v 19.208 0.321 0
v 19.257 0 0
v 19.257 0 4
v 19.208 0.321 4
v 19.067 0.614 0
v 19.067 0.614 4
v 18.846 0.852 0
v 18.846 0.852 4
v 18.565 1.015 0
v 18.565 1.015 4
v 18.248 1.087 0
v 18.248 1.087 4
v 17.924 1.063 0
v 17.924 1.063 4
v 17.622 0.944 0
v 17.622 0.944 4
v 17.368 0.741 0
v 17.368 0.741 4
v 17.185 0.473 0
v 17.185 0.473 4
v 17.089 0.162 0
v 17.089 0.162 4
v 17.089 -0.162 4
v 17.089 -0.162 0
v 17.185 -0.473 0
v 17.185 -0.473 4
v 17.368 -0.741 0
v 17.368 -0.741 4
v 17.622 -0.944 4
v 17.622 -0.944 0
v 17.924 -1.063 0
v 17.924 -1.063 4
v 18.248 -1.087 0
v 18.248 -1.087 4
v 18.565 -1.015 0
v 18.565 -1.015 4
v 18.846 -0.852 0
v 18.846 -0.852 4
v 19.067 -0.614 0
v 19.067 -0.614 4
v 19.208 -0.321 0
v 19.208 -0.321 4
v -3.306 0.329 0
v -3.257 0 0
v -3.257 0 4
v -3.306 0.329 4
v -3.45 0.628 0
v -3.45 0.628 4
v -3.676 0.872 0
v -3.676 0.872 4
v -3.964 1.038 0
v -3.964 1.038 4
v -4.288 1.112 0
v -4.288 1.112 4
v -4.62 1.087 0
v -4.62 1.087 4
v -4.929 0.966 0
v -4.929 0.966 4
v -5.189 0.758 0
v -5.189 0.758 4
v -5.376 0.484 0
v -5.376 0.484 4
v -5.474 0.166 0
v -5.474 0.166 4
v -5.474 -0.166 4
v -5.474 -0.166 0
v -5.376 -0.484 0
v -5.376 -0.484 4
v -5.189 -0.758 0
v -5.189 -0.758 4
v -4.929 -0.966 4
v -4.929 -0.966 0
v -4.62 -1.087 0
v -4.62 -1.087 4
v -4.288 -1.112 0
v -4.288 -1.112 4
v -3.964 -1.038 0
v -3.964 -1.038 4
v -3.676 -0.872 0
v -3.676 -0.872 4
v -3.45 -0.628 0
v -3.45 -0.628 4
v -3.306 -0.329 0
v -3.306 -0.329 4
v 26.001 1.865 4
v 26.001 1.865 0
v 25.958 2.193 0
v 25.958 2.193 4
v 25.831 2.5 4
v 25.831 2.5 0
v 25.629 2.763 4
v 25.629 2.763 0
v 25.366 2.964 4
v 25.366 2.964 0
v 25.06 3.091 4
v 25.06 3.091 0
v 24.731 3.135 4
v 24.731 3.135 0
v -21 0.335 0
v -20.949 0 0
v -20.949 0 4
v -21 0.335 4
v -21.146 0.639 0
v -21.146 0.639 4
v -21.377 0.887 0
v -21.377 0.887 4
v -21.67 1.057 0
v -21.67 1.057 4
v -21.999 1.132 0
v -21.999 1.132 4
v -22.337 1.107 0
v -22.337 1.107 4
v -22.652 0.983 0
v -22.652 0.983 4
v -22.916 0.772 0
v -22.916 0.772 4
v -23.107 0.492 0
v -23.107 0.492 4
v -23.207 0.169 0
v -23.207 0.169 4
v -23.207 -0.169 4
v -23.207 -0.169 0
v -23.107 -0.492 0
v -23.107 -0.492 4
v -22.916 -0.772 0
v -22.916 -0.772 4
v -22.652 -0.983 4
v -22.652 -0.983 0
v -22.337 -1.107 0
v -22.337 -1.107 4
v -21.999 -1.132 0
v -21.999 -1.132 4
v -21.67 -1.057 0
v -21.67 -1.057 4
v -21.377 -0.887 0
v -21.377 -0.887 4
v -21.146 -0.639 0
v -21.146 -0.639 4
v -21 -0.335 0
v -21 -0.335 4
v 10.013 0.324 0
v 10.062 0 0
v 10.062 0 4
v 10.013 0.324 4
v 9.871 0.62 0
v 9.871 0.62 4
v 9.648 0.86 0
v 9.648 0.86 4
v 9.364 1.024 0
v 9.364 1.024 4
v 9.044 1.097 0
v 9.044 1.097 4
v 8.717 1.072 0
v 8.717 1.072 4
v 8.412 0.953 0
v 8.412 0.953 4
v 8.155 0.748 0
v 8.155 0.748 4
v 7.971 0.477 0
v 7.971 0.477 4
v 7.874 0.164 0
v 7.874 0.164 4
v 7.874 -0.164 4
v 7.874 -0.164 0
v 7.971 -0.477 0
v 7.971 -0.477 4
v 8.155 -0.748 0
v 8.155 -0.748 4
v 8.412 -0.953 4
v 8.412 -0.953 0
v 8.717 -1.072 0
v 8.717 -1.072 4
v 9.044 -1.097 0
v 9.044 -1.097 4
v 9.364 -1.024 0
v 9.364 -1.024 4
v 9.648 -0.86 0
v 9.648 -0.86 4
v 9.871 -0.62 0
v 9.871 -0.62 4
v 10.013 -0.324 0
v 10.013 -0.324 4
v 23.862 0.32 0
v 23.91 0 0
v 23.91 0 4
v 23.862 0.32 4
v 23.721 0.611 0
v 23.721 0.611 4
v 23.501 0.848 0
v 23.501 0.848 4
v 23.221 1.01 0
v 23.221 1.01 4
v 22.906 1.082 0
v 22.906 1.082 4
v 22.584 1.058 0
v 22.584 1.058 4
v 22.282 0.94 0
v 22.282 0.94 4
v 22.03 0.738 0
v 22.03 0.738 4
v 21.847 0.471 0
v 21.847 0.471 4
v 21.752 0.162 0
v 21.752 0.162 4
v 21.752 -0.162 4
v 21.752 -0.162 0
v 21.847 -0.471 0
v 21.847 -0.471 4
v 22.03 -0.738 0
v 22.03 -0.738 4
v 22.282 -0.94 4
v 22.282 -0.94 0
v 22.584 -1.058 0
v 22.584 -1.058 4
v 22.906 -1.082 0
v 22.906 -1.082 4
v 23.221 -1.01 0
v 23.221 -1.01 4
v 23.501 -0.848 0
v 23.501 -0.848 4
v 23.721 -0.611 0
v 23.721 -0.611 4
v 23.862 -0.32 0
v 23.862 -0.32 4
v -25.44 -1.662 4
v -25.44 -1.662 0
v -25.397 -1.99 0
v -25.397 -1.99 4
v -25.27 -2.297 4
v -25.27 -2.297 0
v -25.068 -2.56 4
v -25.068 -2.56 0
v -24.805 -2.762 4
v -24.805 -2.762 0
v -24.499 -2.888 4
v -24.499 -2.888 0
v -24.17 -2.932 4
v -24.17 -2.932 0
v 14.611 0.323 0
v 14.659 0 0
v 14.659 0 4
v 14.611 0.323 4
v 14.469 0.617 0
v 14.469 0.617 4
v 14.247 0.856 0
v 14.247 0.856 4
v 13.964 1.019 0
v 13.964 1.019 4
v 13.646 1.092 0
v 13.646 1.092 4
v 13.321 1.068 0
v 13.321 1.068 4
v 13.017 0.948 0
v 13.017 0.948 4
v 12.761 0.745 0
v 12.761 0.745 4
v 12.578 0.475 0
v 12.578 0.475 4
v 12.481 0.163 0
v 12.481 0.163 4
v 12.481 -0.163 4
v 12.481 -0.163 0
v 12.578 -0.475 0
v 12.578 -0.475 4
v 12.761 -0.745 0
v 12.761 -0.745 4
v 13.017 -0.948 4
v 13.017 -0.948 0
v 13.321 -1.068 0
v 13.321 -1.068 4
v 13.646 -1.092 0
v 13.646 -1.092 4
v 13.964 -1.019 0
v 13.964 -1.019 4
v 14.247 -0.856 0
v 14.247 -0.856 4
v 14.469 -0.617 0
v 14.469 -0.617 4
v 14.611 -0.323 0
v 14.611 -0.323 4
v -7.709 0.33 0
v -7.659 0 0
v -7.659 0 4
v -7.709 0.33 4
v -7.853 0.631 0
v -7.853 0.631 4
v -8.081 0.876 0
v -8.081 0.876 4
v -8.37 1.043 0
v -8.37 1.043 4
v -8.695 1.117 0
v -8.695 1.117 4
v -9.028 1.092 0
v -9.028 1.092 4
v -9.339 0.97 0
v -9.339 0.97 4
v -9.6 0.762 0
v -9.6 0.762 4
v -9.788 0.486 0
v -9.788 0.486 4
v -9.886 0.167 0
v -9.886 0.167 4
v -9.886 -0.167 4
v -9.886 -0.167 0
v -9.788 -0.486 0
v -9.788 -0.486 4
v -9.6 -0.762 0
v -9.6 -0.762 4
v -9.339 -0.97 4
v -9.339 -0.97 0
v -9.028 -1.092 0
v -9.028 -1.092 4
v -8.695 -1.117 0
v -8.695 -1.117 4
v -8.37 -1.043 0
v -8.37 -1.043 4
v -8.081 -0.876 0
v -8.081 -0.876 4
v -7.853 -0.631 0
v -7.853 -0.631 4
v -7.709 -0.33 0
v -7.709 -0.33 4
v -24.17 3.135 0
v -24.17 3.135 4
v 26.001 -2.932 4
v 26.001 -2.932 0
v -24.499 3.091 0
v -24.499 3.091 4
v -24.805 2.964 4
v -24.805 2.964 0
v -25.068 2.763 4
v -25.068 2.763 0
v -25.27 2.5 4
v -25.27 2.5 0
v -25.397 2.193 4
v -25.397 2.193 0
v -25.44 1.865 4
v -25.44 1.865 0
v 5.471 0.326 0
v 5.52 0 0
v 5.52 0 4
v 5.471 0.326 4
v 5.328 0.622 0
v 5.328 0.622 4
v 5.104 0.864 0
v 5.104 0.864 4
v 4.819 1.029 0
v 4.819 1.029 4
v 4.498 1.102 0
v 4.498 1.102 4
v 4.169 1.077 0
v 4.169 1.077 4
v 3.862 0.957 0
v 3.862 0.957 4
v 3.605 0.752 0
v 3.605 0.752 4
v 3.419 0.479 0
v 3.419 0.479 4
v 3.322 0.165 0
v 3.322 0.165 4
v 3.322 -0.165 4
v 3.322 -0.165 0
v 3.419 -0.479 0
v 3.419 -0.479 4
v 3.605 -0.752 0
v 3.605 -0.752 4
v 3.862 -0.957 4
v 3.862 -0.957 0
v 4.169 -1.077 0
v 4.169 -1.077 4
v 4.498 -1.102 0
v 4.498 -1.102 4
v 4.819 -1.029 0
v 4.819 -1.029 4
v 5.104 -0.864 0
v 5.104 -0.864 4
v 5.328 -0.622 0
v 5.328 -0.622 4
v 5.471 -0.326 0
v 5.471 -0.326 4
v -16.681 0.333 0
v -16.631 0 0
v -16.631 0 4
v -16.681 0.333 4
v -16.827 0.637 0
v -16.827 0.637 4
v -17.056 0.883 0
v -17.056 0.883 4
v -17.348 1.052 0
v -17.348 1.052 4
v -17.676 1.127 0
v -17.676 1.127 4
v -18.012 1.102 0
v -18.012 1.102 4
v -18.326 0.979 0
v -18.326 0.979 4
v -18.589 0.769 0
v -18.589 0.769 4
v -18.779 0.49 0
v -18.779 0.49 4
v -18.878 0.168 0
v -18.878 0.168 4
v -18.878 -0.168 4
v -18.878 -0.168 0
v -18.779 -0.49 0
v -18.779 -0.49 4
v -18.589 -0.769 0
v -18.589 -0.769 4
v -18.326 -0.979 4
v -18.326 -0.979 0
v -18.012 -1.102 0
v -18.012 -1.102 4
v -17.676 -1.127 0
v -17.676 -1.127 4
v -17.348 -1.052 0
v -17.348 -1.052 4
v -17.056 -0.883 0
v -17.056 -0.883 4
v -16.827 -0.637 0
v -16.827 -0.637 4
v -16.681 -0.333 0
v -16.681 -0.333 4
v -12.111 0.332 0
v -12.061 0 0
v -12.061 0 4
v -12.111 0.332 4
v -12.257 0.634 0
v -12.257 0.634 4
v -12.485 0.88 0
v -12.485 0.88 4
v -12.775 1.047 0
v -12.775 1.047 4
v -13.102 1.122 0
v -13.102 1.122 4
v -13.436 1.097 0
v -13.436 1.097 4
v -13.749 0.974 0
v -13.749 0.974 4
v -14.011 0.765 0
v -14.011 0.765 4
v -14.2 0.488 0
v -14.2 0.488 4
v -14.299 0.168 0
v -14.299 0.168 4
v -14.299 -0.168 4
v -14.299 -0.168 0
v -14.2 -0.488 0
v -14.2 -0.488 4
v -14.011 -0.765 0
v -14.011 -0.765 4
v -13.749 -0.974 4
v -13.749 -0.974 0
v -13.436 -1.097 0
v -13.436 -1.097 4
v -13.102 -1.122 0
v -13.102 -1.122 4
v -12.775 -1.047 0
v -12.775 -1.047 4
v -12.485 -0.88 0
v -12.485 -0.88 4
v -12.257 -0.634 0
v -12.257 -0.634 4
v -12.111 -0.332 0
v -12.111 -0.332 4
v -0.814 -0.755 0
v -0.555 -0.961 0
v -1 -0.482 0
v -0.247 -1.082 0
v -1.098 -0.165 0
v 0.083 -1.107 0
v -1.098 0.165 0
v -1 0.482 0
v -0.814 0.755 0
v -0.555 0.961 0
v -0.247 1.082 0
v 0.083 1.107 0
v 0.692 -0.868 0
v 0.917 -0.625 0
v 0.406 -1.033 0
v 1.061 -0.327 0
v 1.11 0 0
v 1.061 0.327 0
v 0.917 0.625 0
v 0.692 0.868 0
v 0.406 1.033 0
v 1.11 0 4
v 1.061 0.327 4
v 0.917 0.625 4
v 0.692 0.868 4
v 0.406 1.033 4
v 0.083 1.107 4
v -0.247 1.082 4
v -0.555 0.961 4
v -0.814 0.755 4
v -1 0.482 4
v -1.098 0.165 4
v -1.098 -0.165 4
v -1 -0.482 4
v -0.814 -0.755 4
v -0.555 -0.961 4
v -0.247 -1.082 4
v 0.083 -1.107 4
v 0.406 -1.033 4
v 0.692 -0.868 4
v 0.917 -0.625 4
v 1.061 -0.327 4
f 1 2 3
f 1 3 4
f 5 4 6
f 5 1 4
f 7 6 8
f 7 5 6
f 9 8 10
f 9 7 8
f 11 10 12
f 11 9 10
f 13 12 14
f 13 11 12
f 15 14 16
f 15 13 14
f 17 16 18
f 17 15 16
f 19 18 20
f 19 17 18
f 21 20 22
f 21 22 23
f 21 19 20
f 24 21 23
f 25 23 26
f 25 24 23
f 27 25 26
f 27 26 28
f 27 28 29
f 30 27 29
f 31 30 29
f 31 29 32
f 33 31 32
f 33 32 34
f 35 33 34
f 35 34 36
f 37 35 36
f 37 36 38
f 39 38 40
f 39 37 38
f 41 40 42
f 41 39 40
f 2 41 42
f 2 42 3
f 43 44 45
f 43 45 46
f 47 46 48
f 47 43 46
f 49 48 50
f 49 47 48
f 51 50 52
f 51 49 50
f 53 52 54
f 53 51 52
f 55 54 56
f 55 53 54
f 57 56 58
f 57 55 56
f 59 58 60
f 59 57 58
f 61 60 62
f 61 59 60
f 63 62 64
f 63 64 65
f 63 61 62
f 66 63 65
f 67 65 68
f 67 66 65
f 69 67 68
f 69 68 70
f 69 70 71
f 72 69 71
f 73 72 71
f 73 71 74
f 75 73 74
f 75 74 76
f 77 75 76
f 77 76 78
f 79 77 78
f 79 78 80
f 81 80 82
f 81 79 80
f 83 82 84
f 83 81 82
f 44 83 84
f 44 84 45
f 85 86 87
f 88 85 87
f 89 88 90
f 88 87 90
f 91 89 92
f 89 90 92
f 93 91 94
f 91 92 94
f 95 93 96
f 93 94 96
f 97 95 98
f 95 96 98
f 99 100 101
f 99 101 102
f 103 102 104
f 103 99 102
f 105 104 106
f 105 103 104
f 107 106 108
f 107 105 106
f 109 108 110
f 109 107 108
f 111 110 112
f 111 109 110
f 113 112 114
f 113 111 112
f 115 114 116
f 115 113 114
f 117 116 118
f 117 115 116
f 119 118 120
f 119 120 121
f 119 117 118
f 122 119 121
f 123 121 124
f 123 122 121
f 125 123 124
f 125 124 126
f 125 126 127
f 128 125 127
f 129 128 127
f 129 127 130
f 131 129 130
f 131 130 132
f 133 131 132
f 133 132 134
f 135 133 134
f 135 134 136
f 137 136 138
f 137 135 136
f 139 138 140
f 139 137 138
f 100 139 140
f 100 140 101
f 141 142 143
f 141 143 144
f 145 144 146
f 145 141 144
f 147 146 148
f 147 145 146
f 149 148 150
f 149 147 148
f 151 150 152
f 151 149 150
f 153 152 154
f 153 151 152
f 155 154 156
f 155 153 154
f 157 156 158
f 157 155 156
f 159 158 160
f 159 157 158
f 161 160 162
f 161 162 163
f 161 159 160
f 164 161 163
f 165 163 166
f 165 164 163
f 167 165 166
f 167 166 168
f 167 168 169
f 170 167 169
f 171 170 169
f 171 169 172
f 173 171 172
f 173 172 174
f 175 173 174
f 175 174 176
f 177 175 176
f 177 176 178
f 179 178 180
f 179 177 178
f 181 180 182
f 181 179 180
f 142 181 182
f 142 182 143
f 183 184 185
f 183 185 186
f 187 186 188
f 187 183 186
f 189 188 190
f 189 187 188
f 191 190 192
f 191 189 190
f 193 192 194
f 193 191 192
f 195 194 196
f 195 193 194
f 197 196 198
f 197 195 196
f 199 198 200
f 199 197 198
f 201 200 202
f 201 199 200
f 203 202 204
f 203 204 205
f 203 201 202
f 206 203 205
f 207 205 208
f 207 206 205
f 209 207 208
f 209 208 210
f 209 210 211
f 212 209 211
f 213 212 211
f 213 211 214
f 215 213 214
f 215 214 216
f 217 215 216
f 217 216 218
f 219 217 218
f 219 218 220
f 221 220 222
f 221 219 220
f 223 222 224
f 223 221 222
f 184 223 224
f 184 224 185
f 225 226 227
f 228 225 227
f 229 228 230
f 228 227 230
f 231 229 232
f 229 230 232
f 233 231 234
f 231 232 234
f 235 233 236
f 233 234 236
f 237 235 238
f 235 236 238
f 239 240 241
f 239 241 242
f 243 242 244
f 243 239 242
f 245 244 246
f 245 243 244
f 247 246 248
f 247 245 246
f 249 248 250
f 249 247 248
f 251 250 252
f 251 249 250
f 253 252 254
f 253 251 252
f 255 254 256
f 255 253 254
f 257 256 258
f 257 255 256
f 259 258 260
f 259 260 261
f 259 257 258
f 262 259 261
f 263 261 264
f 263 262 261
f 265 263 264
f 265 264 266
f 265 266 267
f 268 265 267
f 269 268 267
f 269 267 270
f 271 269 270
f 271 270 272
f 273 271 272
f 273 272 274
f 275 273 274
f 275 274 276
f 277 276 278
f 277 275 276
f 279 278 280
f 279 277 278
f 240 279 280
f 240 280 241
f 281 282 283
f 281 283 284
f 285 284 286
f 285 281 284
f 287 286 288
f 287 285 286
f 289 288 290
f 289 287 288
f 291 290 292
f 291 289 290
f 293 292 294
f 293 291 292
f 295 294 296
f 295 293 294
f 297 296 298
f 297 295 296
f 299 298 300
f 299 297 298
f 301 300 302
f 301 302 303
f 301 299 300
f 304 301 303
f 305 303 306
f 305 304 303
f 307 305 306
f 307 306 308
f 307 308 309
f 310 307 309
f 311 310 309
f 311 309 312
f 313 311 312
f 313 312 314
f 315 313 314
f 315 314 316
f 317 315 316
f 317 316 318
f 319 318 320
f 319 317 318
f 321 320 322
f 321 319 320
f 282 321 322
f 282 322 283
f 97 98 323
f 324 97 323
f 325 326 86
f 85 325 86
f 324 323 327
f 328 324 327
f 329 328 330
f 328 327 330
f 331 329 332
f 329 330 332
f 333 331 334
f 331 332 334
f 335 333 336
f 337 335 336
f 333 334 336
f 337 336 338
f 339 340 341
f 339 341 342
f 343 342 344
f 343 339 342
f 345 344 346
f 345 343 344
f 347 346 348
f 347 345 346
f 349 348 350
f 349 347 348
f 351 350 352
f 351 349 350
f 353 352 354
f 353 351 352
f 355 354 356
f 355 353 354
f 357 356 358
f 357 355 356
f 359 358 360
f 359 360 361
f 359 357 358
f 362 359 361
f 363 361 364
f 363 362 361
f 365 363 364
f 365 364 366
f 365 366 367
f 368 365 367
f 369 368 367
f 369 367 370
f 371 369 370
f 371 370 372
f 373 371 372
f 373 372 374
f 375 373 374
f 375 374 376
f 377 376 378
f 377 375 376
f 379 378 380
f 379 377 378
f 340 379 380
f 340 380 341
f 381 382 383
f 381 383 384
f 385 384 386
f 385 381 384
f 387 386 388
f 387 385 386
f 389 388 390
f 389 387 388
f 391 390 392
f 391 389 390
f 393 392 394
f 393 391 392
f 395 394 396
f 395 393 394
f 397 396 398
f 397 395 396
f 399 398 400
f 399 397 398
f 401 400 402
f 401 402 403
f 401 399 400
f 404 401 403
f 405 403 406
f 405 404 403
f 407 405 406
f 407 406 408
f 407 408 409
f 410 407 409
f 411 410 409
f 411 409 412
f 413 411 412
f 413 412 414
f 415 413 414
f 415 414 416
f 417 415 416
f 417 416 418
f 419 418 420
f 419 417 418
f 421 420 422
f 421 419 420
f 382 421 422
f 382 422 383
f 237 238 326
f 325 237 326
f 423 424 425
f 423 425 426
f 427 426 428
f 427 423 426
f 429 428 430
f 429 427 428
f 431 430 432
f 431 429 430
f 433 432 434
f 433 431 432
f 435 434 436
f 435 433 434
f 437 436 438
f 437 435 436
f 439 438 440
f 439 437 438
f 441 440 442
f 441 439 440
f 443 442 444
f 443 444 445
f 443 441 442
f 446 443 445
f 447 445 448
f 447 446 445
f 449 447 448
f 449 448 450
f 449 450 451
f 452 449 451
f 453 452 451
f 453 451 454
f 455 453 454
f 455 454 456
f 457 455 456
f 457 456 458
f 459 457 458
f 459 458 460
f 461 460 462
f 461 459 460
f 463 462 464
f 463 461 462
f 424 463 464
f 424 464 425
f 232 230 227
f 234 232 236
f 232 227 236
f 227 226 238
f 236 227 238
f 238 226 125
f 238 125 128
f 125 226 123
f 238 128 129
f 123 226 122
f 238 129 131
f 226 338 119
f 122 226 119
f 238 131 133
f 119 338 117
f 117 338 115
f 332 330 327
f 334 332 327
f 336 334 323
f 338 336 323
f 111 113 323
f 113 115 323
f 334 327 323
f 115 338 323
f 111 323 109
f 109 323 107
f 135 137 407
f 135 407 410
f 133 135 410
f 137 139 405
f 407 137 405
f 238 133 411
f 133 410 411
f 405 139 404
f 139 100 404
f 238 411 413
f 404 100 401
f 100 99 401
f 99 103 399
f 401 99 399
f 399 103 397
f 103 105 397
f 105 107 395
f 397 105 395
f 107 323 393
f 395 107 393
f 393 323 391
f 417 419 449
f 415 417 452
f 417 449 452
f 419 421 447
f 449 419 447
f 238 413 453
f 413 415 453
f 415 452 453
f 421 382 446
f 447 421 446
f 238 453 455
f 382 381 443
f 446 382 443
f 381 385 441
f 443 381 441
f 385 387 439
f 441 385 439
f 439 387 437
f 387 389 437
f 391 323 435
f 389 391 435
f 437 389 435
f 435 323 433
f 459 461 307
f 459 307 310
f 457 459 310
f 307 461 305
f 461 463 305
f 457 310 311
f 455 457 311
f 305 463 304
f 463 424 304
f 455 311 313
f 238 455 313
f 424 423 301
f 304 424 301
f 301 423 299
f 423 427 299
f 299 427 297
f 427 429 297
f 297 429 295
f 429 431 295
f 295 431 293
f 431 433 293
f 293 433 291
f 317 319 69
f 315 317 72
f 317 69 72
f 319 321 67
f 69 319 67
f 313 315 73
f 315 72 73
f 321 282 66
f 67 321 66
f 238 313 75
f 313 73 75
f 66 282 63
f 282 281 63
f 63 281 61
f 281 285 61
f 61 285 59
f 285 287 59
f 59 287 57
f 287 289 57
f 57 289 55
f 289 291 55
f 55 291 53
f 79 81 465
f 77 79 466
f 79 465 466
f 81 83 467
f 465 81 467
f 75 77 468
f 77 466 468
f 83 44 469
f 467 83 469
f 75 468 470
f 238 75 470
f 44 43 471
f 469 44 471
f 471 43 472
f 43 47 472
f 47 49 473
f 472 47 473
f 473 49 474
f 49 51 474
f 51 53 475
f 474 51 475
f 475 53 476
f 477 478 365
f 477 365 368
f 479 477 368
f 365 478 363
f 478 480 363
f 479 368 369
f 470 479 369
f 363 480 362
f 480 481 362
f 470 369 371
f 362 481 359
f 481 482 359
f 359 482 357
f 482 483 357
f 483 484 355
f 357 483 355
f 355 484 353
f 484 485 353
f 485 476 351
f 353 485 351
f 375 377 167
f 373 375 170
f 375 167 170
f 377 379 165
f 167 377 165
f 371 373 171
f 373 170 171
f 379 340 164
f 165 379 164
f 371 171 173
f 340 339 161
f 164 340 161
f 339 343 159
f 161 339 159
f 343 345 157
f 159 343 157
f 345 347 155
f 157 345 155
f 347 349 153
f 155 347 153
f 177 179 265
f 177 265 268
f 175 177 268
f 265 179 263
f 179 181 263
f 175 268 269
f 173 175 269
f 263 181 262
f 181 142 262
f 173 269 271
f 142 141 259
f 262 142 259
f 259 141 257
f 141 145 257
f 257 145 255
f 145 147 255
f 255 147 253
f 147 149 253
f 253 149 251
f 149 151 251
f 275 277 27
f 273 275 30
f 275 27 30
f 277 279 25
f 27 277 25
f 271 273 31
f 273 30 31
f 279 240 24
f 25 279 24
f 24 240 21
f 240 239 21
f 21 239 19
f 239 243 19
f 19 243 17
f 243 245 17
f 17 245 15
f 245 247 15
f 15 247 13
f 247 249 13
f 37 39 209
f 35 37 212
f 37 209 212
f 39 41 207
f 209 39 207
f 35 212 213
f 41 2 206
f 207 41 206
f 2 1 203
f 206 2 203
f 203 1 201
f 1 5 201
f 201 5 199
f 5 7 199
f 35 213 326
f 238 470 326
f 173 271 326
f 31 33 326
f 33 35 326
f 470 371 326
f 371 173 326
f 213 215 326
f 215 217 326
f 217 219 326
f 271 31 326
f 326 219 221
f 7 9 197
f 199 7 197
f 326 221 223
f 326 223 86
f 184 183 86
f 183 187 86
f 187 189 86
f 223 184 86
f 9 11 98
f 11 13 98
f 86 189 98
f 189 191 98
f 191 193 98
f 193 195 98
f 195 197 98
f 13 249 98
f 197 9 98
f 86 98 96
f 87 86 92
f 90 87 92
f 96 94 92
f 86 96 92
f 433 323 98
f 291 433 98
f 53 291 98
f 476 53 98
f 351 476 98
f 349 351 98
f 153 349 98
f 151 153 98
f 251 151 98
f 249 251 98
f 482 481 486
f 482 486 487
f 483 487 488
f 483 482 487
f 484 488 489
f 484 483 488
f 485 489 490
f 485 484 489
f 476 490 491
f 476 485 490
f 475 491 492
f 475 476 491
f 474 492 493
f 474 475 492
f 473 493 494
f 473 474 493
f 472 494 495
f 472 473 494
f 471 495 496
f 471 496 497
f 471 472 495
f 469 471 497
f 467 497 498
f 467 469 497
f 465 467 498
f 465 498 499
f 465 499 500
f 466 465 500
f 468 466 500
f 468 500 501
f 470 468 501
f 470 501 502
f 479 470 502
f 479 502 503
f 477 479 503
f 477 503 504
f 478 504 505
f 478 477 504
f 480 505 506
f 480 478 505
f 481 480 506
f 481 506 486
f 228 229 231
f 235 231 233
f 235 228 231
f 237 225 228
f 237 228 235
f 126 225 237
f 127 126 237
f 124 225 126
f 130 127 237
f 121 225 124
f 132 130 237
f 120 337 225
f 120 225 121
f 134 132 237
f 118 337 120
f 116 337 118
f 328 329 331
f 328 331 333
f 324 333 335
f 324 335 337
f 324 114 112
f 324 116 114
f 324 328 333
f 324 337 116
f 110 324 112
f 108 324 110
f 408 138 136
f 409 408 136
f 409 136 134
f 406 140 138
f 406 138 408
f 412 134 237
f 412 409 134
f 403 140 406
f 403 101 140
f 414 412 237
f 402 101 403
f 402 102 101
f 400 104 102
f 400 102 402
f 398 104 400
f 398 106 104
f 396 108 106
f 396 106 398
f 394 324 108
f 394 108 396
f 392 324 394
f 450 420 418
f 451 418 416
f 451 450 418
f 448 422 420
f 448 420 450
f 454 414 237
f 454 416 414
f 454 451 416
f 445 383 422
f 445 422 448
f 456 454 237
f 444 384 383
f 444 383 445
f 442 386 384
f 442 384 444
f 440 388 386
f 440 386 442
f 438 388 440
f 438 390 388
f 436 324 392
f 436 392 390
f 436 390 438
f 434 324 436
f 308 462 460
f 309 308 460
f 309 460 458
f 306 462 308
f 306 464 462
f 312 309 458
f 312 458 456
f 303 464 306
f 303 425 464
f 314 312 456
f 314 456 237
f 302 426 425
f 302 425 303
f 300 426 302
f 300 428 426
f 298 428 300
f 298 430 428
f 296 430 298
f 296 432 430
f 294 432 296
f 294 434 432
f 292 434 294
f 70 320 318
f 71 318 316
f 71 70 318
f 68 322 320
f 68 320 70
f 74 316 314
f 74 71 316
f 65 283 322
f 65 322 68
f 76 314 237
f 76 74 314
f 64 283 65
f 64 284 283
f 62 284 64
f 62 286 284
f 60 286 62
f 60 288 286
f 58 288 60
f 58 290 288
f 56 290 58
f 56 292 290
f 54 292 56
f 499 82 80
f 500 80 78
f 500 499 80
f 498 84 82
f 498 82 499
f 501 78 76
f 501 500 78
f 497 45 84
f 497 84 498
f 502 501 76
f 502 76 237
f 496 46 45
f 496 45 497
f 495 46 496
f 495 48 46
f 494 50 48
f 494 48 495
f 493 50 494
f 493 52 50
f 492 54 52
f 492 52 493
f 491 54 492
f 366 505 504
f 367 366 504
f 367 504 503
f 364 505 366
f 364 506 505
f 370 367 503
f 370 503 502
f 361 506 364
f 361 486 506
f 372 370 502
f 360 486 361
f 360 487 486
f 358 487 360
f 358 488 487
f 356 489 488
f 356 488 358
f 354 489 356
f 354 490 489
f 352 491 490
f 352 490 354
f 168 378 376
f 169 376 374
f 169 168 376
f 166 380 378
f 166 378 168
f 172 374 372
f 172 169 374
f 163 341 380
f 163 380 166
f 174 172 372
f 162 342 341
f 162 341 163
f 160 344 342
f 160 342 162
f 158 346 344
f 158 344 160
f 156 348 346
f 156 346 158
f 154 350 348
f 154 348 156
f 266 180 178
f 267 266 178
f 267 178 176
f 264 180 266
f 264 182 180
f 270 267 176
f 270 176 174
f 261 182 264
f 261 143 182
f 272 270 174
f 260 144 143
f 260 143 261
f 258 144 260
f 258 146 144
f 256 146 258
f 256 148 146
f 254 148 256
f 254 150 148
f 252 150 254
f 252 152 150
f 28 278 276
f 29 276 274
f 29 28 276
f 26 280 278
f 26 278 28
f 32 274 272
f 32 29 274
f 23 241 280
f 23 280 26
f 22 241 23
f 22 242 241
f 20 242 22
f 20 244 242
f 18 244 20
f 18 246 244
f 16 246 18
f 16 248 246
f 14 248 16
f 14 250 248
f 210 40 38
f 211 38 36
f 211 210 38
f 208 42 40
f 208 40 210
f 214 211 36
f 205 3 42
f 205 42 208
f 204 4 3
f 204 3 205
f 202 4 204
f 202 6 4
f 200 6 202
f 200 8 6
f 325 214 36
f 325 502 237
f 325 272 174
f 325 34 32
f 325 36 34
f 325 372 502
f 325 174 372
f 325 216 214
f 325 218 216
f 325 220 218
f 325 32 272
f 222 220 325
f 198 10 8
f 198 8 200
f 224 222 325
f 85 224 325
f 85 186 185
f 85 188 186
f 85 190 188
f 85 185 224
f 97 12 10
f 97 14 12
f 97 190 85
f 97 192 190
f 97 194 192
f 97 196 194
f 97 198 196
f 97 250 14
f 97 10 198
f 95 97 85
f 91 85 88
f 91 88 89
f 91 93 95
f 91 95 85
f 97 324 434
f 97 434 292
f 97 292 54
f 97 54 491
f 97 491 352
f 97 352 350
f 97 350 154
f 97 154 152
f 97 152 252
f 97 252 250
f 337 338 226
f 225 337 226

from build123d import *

# Parameters (mm, degrees)
F0_R     = 1.135
F0_R_2   = 1.13
F0_R_3   = 1.125
F0_R_4   = 1.12
F0_R_5   = 1.115
F0_R_6   = 1.11
F0_R_7   = 1.105
F0_R_8   = 1.1
F0_R_9   = 1.095
F0_R_10  = 1.09
F0_R_11  = 1.085
F1_DEPTH = 4


with BuildPart() as f1:
    # F0 (on Top) → F1 (new body)
    with BuildSketch(Plane.XY):
        with BuildLine():
            Line((24.731134, 3.134596), (-24.169983, 3.134596))
            ThreePointArc((-24.169983, 3.134596), (-25.068009, 2.762621), (-25.439983, 1.864596))
            Line((-25.439983, 1.864596), (-25.439983, -1.661713))
            ThreePointArc((-25.439983, -1.661713), (-25.068009, -2.559739), (-24.169983, -2.931713))
            Line((-24.169983, -2.931713), (26.001134, -2.931713))
            Line((26.001134, -2.931713), (26.001134, 1.864596))
            ThreePointArc((26.001134, 1.864596), (25.62916, 2.762621), (24.731134, 3.134596))
        make_face()
        with Locations((-22.08424, 0)):
            Circle(F0_R, mode=Mode.SUBTRACT)
        with Locations((-17.760683, 0)):
            Circle(F0_R_2, mode=Mode.SUBTRACT)
        with Locations((-13.18608, 0)):
            Circle(F0_R_3, mode=Mode.SUBTRACT)
        with Locations((-8.778842, 0)):
            Circle(F0_R_4, mode=Mode.SUBTRACT)
        with Locations((-4.371603, 0)):
            Circle(F0_R_5, mode=Mode.SUBTRACT)
        Circle(F0_R_6, mode=Mode.SUBTRACT)
        with Locations((4.41498, 0)):
            Circle(F0_R_7, mode=Mode.SUBTRACT)
        with Locations((8.961688, 0)):
            Circle(F0_R_8, mode=Mode.SUBTRACT)
        with Locations((13.564184, 0)):
            Circle(F0_R_9, mode=Mode.SUBTRACT)
        with Locations((18.16668, 0)):
            Circle(F0_R_10, mode=Mode.SUBTRACT)
        with Locations((22.824964, 0)):
            Circle(F0_R_11, mode=Mode.SUBTRACT)
    extrude(amount=F1_DEPTH)


solid = f1.part
